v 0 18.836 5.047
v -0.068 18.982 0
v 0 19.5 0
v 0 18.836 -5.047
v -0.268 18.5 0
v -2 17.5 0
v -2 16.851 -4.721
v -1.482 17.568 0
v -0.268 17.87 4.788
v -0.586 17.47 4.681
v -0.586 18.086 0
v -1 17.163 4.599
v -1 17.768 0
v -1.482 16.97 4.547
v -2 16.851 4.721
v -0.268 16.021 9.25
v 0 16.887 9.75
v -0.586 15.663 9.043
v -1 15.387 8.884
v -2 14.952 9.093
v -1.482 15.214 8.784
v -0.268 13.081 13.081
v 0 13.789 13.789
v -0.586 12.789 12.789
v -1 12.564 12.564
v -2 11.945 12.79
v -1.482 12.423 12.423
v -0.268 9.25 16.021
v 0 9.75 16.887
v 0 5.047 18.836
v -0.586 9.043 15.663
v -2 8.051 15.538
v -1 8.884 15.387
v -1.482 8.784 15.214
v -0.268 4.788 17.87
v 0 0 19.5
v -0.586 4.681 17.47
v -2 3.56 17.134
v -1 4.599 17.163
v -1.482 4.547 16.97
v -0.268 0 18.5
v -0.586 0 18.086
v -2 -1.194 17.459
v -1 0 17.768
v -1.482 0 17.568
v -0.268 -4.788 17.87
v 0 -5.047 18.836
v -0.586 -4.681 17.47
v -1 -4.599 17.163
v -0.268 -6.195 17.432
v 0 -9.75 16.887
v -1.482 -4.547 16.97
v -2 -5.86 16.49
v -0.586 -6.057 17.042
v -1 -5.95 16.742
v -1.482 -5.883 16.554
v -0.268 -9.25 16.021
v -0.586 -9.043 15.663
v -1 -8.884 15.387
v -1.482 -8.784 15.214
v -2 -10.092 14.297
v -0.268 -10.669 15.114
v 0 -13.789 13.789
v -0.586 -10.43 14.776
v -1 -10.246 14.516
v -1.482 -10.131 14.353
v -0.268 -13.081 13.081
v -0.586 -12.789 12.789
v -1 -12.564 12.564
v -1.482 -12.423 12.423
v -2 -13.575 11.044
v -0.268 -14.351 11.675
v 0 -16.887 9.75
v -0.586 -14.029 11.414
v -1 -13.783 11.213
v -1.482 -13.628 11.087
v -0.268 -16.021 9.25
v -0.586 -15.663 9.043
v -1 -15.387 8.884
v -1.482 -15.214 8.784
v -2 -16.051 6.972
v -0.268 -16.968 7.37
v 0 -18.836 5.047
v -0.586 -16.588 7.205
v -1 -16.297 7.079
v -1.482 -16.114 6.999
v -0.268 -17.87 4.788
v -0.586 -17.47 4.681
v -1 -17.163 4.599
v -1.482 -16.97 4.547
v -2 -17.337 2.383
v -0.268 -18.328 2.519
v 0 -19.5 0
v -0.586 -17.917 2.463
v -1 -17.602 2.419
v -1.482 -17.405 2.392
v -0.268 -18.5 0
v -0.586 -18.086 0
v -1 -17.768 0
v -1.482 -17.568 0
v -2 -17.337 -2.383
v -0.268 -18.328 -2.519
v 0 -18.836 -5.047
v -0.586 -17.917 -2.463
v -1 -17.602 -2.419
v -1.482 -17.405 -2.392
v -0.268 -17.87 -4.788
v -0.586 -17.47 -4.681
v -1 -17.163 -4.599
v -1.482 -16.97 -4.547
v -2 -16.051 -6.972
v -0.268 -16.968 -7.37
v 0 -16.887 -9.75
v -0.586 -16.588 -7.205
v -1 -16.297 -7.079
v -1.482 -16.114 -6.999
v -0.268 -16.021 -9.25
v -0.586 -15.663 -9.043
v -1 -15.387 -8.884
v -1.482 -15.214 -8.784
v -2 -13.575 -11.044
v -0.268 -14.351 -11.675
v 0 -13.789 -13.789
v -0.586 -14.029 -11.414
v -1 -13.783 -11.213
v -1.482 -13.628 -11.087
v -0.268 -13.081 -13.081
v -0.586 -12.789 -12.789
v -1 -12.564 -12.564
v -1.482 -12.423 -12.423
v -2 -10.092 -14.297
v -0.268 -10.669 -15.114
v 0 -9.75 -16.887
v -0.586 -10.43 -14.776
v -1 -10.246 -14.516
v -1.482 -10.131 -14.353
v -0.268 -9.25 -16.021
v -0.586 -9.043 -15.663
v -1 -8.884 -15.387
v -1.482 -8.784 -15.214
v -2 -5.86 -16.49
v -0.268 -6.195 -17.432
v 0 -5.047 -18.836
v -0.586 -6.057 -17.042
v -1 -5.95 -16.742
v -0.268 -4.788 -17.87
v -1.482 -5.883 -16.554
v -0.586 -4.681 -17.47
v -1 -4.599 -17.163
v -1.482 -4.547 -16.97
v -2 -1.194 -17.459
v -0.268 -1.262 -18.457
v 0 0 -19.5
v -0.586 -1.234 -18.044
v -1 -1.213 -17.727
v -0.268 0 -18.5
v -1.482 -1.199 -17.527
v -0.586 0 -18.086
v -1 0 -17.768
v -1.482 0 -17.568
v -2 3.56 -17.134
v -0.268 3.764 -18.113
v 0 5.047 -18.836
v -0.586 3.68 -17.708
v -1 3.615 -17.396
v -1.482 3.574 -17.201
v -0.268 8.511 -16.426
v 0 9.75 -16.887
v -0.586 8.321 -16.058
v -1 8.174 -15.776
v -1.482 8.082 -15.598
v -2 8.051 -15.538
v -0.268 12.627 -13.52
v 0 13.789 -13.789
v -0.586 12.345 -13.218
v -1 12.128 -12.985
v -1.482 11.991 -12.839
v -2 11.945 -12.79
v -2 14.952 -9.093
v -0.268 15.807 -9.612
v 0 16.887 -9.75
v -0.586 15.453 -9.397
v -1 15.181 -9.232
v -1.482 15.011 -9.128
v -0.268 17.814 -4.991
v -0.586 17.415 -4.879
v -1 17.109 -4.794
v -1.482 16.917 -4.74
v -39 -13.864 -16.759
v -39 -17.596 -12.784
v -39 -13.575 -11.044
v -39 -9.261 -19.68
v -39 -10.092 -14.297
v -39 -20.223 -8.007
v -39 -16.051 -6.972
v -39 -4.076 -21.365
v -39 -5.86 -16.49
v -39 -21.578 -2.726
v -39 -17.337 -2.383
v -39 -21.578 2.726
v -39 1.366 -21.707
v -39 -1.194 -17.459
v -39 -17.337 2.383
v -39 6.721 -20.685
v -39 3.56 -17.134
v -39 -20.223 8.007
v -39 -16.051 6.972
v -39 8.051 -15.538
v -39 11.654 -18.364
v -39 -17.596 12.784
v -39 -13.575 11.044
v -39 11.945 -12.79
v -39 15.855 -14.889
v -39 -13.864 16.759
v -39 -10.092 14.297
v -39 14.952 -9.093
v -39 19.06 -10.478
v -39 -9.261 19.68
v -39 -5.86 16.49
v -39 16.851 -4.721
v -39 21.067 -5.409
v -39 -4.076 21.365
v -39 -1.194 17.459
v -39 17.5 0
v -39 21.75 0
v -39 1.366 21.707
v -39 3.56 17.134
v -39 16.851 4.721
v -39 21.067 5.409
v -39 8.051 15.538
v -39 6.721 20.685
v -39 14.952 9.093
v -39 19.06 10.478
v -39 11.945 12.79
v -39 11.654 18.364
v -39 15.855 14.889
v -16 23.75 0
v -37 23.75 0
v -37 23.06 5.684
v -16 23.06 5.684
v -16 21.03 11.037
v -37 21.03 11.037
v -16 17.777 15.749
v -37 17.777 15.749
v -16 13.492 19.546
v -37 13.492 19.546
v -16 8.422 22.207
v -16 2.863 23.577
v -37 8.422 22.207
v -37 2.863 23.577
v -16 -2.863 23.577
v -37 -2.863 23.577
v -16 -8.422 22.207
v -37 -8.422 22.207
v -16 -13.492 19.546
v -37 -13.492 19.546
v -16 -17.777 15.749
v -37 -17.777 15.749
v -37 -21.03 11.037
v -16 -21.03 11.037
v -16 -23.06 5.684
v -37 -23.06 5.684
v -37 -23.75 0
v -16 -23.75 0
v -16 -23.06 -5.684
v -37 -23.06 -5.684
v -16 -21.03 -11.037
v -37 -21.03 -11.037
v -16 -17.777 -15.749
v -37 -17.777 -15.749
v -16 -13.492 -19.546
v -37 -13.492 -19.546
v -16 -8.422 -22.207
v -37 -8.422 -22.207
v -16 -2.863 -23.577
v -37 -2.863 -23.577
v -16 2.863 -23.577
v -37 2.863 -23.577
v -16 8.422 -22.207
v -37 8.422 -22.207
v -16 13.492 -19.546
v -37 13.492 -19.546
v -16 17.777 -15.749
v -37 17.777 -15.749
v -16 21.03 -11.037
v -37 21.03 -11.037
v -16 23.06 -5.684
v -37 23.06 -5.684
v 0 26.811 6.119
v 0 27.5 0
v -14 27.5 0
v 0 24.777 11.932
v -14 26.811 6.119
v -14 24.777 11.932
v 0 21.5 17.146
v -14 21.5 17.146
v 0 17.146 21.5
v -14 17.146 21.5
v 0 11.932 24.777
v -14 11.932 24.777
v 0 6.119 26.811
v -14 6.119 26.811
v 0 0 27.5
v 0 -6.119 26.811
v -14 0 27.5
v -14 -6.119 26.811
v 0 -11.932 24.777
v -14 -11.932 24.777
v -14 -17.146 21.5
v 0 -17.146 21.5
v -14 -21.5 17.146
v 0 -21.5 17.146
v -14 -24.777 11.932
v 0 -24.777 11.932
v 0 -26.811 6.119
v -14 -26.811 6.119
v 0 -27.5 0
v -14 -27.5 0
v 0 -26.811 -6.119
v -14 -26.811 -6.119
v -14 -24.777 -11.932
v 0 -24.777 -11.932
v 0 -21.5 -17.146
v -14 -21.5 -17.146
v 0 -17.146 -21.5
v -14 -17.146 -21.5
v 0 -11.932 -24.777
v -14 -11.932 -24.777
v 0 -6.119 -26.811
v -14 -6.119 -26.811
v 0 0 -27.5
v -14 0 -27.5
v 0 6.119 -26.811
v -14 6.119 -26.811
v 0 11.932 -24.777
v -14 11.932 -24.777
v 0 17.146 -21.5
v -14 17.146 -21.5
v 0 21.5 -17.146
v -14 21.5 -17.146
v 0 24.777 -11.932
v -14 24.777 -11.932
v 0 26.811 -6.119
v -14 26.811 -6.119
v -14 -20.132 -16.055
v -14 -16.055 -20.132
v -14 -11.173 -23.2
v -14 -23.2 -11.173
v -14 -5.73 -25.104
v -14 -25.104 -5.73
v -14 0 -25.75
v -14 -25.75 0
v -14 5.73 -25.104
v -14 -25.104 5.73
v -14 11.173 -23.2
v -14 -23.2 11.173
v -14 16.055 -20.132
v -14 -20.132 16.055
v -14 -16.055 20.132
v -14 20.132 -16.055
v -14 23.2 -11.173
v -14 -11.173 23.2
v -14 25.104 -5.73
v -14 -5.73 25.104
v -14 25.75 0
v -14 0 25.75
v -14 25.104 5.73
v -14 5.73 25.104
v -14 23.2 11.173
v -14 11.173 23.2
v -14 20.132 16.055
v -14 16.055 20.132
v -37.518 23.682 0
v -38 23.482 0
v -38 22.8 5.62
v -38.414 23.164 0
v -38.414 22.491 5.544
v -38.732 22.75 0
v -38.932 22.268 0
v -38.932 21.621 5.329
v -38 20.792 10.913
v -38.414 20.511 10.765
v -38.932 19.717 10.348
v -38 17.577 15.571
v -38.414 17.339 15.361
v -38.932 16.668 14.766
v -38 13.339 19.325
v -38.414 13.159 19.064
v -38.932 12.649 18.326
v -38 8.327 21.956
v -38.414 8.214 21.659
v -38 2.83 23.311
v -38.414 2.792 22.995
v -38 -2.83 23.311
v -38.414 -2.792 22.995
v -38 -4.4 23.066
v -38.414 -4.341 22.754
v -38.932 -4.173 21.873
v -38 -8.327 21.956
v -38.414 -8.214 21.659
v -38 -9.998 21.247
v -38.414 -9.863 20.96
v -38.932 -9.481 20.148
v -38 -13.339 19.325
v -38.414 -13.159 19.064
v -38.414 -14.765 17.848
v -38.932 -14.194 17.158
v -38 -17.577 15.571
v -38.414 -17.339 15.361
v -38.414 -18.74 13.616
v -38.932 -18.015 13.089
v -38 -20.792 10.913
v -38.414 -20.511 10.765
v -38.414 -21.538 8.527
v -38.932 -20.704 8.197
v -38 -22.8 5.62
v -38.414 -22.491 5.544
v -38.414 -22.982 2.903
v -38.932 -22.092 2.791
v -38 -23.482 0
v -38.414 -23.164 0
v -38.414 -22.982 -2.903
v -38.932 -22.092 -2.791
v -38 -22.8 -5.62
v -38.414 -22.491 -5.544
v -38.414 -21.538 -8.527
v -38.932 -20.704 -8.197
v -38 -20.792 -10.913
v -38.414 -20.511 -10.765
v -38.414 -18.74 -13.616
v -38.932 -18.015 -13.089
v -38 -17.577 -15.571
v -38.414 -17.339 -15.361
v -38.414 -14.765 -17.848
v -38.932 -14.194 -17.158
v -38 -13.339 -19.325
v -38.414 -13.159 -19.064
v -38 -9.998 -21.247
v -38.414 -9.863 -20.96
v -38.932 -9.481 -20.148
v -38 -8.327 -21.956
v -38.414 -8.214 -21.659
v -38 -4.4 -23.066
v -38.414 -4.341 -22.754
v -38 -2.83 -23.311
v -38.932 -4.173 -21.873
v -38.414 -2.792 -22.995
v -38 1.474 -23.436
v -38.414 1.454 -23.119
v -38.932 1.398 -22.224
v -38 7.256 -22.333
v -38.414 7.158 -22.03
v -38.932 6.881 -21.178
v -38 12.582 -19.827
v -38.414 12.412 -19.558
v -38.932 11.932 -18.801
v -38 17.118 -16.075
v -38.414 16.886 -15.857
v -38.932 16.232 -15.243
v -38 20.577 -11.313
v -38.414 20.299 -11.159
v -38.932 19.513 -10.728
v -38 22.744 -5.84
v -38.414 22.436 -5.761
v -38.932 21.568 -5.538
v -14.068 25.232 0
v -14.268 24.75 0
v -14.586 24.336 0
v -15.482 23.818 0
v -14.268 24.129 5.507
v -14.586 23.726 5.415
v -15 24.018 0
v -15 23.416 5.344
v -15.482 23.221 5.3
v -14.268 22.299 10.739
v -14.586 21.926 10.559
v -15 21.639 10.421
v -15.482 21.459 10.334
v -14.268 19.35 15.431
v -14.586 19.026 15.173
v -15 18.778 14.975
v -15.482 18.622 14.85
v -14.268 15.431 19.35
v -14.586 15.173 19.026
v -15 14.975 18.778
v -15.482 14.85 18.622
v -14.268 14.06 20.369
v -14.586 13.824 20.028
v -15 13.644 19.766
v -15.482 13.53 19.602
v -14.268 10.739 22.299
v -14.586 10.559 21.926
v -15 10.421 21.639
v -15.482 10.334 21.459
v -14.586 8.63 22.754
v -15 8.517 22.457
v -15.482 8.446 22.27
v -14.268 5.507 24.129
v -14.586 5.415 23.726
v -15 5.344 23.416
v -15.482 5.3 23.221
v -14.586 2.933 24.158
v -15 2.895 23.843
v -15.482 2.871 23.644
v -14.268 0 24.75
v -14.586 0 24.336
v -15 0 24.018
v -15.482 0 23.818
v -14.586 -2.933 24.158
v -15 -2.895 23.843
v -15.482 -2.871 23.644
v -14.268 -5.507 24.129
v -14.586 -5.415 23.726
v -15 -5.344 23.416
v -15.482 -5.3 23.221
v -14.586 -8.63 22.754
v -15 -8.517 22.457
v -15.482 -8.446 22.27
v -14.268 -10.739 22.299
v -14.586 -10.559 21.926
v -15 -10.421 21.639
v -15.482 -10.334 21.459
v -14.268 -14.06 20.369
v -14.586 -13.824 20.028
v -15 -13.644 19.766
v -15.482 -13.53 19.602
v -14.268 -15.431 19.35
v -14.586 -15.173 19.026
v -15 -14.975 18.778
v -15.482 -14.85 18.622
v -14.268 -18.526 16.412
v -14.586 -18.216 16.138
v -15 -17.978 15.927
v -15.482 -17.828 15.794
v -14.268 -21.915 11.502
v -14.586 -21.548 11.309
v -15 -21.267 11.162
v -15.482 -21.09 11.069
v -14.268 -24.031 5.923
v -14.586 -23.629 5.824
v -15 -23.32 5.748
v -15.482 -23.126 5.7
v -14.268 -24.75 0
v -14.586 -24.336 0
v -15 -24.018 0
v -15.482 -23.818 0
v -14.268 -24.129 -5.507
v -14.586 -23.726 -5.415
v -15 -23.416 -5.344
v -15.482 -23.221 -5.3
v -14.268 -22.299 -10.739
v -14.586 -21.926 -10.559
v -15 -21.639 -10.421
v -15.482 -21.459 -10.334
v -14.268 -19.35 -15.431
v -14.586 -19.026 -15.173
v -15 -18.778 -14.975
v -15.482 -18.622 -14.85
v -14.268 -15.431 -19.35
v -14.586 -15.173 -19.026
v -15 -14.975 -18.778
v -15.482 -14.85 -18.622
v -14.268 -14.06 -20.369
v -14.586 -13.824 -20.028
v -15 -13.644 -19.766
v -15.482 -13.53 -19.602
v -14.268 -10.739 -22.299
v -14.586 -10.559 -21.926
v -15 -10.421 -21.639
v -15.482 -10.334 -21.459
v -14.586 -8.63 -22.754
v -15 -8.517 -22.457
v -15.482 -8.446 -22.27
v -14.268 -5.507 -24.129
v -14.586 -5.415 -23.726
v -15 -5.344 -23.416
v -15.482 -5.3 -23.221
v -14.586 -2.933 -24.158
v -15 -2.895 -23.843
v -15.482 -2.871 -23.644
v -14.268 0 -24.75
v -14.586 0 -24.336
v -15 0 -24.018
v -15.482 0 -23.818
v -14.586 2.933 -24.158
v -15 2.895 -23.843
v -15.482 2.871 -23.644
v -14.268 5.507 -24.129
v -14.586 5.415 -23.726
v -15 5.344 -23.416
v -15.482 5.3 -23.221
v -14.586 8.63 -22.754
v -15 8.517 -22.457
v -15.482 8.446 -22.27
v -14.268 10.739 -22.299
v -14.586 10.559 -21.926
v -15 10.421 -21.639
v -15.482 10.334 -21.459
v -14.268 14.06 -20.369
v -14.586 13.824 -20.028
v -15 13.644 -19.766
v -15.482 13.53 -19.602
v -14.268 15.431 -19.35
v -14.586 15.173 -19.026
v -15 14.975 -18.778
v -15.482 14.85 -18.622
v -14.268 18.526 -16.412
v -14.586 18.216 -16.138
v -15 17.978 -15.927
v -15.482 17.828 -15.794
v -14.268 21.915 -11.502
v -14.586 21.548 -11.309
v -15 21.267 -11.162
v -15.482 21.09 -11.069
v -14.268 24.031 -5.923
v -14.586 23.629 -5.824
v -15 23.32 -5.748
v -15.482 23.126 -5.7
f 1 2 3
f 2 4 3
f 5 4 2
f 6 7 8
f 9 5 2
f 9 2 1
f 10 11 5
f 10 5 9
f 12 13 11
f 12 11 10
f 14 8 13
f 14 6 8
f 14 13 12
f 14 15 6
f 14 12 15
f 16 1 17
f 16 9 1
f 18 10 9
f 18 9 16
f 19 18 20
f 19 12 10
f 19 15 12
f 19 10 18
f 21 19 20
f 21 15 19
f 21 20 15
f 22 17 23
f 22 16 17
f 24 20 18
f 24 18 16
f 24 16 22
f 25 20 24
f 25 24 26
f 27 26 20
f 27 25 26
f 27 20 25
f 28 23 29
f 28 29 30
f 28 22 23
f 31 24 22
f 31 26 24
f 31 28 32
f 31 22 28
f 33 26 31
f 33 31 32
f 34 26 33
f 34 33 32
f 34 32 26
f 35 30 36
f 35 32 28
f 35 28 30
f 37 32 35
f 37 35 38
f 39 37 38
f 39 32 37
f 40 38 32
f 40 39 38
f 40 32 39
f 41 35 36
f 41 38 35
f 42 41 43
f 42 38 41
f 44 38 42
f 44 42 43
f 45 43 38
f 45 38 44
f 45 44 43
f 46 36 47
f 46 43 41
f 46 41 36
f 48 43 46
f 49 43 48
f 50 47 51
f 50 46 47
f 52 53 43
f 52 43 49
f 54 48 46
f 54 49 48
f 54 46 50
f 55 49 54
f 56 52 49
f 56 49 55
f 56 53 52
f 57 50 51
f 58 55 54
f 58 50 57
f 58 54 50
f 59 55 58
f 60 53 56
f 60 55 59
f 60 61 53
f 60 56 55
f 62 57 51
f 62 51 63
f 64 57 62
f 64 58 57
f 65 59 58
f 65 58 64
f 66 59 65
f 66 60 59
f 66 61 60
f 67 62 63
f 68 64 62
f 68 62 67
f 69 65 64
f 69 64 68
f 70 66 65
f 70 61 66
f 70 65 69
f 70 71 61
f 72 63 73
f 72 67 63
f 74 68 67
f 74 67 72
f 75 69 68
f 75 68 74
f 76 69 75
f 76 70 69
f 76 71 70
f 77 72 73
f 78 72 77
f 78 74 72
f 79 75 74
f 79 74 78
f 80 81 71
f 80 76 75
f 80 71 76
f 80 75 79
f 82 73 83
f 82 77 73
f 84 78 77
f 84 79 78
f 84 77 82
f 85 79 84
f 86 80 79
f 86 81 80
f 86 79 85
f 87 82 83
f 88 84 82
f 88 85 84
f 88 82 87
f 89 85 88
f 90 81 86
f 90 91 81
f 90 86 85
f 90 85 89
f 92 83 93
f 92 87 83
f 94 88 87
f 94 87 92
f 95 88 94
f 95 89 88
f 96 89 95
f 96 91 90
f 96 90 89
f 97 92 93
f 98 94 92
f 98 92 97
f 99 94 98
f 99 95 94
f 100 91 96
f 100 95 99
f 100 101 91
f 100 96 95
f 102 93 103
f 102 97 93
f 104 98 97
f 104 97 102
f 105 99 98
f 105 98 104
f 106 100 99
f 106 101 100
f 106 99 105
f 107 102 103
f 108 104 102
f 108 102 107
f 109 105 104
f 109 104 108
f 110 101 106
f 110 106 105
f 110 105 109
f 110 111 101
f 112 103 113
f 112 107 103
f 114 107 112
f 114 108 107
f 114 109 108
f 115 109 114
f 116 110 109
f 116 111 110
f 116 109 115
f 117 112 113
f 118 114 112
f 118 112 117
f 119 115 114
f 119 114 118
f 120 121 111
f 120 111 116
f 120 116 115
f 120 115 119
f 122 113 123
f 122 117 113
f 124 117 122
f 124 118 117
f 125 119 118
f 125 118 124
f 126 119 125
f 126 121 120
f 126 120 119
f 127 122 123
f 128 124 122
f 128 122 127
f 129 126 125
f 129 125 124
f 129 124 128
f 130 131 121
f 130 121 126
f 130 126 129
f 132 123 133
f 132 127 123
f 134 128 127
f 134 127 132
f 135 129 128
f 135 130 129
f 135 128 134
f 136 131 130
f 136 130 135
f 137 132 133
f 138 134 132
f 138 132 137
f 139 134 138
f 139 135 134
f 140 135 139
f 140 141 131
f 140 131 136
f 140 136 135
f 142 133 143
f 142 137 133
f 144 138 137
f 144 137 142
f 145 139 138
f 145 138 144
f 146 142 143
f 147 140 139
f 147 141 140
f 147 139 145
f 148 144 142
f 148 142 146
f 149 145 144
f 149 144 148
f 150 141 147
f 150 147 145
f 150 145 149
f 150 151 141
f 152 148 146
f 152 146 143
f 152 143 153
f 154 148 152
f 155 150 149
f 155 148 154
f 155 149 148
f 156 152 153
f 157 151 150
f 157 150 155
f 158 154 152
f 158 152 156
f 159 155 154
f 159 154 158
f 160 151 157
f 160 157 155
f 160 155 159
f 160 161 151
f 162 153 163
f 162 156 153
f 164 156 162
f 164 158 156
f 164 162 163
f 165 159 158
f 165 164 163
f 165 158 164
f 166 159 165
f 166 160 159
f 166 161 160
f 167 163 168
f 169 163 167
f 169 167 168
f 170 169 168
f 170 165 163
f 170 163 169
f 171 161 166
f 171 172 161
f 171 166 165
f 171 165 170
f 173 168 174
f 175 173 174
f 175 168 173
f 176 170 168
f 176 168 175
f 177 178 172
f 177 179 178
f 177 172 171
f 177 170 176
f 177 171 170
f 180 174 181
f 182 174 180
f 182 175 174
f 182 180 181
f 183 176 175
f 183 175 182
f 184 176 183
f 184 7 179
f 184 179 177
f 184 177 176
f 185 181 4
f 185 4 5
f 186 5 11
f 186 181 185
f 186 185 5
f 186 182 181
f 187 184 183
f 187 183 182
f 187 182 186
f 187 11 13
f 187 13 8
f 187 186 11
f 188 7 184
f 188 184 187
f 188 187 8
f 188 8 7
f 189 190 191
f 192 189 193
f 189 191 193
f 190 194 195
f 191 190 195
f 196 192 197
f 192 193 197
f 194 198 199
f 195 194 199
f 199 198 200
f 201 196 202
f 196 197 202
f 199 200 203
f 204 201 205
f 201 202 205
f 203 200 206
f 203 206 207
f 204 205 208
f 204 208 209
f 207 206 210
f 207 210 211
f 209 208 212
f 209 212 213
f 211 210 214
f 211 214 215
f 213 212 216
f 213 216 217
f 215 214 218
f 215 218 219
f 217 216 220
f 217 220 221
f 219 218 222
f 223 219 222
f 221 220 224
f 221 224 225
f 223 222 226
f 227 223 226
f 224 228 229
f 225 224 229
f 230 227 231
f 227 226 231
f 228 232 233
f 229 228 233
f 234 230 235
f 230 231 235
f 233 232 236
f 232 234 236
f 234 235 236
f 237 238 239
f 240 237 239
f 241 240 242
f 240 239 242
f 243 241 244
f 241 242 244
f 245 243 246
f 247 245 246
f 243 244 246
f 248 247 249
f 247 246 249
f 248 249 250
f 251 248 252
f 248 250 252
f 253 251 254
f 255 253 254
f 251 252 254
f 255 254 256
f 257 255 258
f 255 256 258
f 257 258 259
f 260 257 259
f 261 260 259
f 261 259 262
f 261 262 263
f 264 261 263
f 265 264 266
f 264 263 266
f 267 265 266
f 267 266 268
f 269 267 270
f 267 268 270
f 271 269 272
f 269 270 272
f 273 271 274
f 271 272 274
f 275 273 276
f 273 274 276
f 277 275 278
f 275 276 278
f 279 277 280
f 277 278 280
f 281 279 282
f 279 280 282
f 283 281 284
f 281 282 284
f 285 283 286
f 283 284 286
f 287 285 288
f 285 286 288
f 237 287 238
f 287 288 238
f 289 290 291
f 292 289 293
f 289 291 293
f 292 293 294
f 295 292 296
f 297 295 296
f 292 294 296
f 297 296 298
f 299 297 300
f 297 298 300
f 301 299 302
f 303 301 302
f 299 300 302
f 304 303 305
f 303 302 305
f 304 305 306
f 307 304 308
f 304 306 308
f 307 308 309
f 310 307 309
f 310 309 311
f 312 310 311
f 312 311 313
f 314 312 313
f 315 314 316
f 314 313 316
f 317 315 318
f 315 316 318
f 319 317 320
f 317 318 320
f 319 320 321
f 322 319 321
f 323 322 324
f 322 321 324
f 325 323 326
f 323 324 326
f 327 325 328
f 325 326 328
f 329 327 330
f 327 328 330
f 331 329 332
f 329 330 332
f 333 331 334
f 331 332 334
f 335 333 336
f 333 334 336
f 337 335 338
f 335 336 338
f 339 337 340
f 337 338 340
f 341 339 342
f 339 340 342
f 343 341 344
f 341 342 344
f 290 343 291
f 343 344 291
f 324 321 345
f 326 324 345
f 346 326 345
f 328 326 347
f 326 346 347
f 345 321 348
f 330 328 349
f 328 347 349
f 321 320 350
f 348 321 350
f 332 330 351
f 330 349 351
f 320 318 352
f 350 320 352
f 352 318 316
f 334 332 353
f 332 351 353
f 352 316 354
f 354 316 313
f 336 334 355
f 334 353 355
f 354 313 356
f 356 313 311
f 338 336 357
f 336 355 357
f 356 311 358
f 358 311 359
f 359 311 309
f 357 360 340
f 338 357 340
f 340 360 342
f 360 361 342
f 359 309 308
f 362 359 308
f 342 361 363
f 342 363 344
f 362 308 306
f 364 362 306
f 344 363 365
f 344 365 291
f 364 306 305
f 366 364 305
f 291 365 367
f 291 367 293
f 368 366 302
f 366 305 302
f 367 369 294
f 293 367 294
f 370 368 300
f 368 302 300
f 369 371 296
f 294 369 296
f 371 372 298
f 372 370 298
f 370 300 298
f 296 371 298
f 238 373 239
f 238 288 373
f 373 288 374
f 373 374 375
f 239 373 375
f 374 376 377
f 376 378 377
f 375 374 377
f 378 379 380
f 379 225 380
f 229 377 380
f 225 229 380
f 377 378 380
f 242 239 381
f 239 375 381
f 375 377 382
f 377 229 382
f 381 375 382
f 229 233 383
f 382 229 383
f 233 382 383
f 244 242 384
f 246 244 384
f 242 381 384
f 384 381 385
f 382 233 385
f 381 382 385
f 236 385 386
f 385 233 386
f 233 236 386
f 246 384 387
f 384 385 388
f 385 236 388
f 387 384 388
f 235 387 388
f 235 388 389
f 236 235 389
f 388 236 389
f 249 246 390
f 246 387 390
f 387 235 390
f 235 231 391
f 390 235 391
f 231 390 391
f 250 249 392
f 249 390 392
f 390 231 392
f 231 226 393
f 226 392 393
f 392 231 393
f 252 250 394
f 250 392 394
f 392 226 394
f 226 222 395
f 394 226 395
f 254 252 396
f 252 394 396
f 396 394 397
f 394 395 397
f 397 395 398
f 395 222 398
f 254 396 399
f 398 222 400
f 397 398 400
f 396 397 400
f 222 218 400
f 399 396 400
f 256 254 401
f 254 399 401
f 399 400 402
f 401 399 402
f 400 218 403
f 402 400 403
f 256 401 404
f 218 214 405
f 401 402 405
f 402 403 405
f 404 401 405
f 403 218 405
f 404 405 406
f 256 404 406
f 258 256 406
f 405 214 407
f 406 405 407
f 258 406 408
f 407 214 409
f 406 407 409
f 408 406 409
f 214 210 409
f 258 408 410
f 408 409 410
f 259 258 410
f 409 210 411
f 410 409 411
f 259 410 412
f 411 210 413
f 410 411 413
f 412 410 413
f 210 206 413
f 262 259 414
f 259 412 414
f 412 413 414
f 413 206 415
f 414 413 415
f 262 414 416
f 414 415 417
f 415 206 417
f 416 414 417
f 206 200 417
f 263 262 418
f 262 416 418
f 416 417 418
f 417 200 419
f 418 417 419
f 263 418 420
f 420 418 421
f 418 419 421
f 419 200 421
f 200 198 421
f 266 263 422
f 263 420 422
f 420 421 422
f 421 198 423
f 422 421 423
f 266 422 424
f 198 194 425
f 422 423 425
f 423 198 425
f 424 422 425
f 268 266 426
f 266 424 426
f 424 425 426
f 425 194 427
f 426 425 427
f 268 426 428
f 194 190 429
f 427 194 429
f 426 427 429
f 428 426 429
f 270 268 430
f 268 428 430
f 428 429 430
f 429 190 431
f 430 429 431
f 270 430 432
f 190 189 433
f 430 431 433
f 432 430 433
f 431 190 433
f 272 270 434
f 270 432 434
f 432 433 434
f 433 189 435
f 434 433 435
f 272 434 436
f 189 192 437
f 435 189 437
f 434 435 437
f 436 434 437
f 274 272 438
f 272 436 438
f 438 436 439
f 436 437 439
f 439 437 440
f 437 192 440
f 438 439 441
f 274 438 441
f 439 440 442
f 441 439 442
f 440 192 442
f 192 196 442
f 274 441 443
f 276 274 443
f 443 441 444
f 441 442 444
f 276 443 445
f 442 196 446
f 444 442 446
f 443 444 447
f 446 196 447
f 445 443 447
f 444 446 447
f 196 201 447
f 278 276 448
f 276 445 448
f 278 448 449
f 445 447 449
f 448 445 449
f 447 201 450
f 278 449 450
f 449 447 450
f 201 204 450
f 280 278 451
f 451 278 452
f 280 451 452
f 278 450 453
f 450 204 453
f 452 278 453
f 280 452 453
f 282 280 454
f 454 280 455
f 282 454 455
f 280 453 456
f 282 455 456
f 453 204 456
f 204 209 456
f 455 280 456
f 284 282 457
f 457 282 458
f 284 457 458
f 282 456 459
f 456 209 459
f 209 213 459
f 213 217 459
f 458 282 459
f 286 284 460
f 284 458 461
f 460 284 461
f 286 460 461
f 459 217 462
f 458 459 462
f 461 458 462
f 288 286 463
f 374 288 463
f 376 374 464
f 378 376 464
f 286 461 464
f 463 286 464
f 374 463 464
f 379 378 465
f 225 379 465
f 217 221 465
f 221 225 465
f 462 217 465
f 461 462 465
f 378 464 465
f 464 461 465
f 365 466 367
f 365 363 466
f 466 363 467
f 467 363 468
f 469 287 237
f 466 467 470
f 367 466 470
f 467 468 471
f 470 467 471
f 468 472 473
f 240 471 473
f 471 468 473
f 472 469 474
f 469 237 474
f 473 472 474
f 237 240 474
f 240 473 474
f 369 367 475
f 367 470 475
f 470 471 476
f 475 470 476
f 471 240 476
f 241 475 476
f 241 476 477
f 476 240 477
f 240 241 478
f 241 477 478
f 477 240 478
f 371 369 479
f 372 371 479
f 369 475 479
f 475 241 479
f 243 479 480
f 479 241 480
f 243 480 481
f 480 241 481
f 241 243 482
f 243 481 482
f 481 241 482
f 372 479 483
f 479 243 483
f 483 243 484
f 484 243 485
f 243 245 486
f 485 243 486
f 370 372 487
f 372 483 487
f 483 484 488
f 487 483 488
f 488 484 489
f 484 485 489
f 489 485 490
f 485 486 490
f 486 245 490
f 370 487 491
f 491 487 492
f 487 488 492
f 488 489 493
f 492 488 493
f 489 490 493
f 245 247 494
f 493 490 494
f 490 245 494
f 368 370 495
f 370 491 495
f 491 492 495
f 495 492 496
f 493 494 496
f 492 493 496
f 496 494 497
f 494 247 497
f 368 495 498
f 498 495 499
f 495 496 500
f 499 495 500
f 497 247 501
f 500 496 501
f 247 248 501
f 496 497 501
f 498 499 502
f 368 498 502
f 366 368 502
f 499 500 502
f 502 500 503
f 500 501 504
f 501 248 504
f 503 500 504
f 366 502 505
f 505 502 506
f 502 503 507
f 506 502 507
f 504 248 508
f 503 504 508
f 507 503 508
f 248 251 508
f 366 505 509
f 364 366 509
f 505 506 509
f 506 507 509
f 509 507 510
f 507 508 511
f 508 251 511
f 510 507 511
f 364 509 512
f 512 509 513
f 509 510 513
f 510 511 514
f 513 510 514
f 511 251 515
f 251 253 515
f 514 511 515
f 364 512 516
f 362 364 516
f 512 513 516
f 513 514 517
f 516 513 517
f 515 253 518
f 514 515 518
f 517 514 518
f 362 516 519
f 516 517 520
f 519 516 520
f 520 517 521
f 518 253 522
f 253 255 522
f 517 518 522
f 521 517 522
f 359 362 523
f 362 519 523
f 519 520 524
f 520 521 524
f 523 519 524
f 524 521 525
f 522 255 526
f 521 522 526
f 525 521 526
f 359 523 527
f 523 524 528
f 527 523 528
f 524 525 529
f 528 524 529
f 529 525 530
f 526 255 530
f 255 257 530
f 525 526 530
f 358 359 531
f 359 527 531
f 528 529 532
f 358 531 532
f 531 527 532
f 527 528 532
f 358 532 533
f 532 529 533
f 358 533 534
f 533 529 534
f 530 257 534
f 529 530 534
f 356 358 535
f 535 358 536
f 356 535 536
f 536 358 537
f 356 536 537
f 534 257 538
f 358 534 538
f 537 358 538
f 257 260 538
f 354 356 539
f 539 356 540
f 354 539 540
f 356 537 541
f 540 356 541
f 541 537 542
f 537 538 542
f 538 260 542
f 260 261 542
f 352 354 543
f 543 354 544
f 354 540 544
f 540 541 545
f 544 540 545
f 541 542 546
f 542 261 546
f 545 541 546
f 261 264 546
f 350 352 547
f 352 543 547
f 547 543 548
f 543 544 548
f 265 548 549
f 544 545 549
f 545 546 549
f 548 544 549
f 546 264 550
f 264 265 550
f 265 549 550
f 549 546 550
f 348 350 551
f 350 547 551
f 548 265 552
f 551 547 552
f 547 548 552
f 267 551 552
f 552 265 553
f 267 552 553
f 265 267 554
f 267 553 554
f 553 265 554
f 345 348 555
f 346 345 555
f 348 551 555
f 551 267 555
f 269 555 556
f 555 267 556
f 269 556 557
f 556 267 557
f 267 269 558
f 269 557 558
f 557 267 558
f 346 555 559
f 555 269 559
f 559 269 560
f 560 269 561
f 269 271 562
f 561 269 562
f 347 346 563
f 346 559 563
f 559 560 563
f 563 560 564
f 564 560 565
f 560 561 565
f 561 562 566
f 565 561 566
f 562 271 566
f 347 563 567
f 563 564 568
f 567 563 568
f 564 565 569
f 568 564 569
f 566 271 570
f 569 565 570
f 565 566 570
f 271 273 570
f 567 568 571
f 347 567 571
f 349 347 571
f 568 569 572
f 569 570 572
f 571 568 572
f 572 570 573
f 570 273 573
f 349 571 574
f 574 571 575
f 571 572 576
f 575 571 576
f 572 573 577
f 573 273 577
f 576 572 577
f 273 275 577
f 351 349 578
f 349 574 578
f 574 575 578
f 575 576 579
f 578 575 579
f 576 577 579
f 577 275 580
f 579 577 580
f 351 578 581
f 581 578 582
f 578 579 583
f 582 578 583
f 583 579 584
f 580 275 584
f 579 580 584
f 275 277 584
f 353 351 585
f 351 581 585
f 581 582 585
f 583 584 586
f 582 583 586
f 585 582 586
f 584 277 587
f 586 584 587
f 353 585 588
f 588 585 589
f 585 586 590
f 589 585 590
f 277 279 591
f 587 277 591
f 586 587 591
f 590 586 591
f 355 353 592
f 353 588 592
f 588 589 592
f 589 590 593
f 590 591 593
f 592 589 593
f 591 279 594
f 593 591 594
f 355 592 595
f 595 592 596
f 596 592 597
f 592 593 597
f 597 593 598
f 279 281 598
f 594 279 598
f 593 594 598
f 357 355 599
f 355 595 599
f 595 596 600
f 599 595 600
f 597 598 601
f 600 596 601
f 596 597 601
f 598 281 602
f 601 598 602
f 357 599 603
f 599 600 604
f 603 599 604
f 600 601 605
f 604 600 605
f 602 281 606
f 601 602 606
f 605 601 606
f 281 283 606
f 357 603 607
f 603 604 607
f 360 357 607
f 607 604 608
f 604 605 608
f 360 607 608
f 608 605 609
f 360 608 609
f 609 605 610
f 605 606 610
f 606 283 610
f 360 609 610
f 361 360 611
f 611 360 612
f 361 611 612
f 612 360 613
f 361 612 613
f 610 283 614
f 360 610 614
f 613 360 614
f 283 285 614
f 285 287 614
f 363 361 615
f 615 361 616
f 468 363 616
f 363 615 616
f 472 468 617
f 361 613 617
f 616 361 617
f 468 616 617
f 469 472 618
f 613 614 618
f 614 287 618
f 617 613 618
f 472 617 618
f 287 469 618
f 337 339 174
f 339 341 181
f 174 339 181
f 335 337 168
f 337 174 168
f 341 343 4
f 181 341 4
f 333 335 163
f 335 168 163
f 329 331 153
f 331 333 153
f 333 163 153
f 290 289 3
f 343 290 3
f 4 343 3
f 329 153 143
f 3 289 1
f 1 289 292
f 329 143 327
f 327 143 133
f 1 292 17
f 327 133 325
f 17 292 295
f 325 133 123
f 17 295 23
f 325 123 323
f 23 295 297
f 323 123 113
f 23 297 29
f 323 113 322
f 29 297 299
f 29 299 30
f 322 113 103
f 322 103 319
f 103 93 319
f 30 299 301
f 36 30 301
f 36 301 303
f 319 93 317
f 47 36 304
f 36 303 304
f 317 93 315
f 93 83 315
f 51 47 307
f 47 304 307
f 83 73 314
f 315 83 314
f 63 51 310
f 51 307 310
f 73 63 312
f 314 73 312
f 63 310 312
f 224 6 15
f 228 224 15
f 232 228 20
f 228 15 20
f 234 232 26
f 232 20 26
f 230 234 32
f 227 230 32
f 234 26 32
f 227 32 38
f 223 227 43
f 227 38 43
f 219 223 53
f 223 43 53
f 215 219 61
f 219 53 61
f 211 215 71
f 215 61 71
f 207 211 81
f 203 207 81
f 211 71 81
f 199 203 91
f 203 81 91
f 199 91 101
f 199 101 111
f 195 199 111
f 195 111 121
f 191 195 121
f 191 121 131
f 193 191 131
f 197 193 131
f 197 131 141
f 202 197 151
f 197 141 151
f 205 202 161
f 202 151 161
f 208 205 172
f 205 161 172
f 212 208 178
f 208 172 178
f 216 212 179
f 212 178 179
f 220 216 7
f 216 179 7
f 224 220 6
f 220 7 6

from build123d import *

# Parameters (mm, degrees)
F2_R = 2
F3_R = 2


with BuildPart() as f1:
    # F0 (on Top) → F1 (revolve)
    with BuildSketch(Plane.XY):
        Polygon((0, 17.5), (0, 27.5), (-14, 27.5), (-14, 23.75), (-39, 23.75), (-39, 17.5), align=None)
    revolve(axis=Axis((-10.876282, 0, 0), (1, 0, 0)))

    # F2
    f2_edges = [f1.edges().sort_by_distance(p)[0] for p in [
        (-14, -23.75, 0),
    ]]
    fillet(f2_edges, radius=F2_R)

    # F3
    f3_edges = [f1.edges().sort_by_distance(p)[0] for p in [
        (-39, -23.75, 0),
        (0, -17.5, 0),
    ]]
    fillet(f3_edges, radius=F3_R)


solid = f1.part
